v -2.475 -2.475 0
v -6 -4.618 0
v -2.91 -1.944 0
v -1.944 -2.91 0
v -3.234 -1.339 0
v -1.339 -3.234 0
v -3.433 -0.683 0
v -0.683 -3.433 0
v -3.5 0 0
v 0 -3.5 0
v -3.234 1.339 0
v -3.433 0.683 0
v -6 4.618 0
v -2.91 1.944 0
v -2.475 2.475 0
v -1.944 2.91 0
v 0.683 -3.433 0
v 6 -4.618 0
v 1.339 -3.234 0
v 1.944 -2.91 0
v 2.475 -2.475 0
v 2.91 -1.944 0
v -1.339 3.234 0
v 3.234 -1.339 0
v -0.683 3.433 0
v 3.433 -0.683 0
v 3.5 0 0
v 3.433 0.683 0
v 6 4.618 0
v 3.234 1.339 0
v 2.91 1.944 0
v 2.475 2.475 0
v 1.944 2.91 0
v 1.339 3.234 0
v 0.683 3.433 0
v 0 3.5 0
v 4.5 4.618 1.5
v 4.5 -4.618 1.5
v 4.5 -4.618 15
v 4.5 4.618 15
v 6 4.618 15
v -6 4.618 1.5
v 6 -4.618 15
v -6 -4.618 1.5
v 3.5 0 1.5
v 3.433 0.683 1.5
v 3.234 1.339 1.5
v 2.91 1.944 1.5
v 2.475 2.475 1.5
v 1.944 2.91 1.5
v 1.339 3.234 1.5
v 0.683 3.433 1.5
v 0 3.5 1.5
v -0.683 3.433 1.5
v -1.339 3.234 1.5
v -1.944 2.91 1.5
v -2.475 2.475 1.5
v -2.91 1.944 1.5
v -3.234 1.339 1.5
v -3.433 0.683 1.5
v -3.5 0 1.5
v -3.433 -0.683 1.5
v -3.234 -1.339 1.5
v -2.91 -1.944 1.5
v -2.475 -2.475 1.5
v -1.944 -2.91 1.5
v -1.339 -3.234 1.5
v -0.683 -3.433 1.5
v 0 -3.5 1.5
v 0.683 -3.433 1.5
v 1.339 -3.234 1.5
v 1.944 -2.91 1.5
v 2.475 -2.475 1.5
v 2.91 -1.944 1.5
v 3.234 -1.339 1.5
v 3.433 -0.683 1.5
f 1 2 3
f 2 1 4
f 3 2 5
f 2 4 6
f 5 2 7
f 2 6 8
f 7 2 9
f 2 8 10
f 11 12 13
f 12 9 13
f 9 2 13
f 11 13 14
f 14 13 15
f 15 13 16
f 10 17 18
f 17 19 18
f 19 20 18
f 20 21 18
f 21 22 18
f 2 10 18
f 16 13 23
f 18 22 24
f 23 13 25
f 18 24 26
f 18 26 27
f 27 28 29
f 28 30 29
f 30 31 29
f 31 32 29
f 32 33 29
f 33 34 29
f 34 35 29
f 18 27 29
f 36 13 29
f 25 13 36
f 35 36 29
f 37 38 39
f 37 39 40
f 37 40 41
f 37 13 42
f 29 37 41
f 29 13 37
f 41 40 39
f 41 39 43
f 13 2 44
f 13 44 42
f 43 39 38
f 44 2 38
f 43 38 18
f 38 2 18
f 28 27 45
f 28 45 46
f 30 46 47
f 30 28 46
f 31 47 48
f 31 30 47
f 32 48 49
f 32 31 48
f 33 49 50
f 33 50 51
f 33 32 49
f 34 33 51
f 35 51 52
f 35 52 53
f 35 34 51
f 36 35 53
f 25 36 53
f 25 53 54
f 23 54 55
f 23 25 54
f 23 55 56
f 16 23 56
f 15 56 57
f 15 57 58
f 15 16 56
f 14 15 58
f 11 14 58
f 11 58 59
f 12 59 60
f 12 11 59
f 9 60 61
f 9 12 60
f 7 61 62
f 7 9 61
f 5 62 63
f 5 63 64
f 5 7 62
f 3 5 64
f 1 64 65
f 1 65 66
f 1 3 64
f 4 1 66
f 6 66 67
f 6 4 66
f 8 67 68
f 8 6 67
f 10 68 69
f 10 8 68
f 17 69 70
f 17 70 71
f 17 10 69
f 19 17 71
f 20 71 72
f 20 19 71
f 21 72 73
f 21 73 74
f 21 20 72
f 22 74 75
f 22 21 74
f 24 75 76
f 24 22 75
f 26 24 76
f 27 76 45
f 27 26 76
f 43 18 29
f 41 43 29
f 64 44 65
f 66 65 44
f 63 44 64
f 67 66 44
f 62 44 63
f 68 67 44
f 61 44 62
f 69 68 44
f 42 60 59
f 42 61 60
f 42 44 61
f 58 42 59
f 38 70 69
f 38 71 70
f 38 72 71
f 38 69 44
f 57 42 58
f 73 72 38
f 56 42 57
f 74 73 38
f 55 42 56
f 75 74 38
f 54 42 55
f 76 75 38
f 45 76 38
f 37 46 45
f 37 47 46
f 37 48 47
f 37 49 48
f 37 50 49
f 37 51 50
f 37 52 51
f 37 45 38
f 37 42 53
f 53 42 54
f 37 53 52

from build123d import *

# Parameters (mm, degrees)
SKETCH1_W           = 10.5
SKETCH1_H           = 9.235397934
SKETCH1_R           = 3.5
BOSS_EXTRUDE1_DEPTH = 1.5
SKETCH1_3_W         = 1.5
SKETCH1_3_H         = 9.235397934
BOSS_EXTRUDE2_DEPTH = 15


with BuildPart() as part:
    # Sketch1 → Boss-Extrude1 (new body)
    with BuildSketch(Plane.XY):
        with Locations((-0.75, 0)):
            Rectangle(SKETCH1_W, SKETCH1_H)
        Circle(SKETCH1_R, mode=Mode.SUBTRACT)
    extrude(amount=BOSS_EXTRUDE1_DEPTH)

    # Sketch1<3> → Boss-Extrude2 (add)
    with BuildSketch(Plane.XY):
        with Locations((5.25, 0)):
            Rectangle(SKETCH1_3_W, SKETCH1_3_H)
    extrude(amount=BOSS_EXTRUDE2_DEPTH)


solid = part.part
